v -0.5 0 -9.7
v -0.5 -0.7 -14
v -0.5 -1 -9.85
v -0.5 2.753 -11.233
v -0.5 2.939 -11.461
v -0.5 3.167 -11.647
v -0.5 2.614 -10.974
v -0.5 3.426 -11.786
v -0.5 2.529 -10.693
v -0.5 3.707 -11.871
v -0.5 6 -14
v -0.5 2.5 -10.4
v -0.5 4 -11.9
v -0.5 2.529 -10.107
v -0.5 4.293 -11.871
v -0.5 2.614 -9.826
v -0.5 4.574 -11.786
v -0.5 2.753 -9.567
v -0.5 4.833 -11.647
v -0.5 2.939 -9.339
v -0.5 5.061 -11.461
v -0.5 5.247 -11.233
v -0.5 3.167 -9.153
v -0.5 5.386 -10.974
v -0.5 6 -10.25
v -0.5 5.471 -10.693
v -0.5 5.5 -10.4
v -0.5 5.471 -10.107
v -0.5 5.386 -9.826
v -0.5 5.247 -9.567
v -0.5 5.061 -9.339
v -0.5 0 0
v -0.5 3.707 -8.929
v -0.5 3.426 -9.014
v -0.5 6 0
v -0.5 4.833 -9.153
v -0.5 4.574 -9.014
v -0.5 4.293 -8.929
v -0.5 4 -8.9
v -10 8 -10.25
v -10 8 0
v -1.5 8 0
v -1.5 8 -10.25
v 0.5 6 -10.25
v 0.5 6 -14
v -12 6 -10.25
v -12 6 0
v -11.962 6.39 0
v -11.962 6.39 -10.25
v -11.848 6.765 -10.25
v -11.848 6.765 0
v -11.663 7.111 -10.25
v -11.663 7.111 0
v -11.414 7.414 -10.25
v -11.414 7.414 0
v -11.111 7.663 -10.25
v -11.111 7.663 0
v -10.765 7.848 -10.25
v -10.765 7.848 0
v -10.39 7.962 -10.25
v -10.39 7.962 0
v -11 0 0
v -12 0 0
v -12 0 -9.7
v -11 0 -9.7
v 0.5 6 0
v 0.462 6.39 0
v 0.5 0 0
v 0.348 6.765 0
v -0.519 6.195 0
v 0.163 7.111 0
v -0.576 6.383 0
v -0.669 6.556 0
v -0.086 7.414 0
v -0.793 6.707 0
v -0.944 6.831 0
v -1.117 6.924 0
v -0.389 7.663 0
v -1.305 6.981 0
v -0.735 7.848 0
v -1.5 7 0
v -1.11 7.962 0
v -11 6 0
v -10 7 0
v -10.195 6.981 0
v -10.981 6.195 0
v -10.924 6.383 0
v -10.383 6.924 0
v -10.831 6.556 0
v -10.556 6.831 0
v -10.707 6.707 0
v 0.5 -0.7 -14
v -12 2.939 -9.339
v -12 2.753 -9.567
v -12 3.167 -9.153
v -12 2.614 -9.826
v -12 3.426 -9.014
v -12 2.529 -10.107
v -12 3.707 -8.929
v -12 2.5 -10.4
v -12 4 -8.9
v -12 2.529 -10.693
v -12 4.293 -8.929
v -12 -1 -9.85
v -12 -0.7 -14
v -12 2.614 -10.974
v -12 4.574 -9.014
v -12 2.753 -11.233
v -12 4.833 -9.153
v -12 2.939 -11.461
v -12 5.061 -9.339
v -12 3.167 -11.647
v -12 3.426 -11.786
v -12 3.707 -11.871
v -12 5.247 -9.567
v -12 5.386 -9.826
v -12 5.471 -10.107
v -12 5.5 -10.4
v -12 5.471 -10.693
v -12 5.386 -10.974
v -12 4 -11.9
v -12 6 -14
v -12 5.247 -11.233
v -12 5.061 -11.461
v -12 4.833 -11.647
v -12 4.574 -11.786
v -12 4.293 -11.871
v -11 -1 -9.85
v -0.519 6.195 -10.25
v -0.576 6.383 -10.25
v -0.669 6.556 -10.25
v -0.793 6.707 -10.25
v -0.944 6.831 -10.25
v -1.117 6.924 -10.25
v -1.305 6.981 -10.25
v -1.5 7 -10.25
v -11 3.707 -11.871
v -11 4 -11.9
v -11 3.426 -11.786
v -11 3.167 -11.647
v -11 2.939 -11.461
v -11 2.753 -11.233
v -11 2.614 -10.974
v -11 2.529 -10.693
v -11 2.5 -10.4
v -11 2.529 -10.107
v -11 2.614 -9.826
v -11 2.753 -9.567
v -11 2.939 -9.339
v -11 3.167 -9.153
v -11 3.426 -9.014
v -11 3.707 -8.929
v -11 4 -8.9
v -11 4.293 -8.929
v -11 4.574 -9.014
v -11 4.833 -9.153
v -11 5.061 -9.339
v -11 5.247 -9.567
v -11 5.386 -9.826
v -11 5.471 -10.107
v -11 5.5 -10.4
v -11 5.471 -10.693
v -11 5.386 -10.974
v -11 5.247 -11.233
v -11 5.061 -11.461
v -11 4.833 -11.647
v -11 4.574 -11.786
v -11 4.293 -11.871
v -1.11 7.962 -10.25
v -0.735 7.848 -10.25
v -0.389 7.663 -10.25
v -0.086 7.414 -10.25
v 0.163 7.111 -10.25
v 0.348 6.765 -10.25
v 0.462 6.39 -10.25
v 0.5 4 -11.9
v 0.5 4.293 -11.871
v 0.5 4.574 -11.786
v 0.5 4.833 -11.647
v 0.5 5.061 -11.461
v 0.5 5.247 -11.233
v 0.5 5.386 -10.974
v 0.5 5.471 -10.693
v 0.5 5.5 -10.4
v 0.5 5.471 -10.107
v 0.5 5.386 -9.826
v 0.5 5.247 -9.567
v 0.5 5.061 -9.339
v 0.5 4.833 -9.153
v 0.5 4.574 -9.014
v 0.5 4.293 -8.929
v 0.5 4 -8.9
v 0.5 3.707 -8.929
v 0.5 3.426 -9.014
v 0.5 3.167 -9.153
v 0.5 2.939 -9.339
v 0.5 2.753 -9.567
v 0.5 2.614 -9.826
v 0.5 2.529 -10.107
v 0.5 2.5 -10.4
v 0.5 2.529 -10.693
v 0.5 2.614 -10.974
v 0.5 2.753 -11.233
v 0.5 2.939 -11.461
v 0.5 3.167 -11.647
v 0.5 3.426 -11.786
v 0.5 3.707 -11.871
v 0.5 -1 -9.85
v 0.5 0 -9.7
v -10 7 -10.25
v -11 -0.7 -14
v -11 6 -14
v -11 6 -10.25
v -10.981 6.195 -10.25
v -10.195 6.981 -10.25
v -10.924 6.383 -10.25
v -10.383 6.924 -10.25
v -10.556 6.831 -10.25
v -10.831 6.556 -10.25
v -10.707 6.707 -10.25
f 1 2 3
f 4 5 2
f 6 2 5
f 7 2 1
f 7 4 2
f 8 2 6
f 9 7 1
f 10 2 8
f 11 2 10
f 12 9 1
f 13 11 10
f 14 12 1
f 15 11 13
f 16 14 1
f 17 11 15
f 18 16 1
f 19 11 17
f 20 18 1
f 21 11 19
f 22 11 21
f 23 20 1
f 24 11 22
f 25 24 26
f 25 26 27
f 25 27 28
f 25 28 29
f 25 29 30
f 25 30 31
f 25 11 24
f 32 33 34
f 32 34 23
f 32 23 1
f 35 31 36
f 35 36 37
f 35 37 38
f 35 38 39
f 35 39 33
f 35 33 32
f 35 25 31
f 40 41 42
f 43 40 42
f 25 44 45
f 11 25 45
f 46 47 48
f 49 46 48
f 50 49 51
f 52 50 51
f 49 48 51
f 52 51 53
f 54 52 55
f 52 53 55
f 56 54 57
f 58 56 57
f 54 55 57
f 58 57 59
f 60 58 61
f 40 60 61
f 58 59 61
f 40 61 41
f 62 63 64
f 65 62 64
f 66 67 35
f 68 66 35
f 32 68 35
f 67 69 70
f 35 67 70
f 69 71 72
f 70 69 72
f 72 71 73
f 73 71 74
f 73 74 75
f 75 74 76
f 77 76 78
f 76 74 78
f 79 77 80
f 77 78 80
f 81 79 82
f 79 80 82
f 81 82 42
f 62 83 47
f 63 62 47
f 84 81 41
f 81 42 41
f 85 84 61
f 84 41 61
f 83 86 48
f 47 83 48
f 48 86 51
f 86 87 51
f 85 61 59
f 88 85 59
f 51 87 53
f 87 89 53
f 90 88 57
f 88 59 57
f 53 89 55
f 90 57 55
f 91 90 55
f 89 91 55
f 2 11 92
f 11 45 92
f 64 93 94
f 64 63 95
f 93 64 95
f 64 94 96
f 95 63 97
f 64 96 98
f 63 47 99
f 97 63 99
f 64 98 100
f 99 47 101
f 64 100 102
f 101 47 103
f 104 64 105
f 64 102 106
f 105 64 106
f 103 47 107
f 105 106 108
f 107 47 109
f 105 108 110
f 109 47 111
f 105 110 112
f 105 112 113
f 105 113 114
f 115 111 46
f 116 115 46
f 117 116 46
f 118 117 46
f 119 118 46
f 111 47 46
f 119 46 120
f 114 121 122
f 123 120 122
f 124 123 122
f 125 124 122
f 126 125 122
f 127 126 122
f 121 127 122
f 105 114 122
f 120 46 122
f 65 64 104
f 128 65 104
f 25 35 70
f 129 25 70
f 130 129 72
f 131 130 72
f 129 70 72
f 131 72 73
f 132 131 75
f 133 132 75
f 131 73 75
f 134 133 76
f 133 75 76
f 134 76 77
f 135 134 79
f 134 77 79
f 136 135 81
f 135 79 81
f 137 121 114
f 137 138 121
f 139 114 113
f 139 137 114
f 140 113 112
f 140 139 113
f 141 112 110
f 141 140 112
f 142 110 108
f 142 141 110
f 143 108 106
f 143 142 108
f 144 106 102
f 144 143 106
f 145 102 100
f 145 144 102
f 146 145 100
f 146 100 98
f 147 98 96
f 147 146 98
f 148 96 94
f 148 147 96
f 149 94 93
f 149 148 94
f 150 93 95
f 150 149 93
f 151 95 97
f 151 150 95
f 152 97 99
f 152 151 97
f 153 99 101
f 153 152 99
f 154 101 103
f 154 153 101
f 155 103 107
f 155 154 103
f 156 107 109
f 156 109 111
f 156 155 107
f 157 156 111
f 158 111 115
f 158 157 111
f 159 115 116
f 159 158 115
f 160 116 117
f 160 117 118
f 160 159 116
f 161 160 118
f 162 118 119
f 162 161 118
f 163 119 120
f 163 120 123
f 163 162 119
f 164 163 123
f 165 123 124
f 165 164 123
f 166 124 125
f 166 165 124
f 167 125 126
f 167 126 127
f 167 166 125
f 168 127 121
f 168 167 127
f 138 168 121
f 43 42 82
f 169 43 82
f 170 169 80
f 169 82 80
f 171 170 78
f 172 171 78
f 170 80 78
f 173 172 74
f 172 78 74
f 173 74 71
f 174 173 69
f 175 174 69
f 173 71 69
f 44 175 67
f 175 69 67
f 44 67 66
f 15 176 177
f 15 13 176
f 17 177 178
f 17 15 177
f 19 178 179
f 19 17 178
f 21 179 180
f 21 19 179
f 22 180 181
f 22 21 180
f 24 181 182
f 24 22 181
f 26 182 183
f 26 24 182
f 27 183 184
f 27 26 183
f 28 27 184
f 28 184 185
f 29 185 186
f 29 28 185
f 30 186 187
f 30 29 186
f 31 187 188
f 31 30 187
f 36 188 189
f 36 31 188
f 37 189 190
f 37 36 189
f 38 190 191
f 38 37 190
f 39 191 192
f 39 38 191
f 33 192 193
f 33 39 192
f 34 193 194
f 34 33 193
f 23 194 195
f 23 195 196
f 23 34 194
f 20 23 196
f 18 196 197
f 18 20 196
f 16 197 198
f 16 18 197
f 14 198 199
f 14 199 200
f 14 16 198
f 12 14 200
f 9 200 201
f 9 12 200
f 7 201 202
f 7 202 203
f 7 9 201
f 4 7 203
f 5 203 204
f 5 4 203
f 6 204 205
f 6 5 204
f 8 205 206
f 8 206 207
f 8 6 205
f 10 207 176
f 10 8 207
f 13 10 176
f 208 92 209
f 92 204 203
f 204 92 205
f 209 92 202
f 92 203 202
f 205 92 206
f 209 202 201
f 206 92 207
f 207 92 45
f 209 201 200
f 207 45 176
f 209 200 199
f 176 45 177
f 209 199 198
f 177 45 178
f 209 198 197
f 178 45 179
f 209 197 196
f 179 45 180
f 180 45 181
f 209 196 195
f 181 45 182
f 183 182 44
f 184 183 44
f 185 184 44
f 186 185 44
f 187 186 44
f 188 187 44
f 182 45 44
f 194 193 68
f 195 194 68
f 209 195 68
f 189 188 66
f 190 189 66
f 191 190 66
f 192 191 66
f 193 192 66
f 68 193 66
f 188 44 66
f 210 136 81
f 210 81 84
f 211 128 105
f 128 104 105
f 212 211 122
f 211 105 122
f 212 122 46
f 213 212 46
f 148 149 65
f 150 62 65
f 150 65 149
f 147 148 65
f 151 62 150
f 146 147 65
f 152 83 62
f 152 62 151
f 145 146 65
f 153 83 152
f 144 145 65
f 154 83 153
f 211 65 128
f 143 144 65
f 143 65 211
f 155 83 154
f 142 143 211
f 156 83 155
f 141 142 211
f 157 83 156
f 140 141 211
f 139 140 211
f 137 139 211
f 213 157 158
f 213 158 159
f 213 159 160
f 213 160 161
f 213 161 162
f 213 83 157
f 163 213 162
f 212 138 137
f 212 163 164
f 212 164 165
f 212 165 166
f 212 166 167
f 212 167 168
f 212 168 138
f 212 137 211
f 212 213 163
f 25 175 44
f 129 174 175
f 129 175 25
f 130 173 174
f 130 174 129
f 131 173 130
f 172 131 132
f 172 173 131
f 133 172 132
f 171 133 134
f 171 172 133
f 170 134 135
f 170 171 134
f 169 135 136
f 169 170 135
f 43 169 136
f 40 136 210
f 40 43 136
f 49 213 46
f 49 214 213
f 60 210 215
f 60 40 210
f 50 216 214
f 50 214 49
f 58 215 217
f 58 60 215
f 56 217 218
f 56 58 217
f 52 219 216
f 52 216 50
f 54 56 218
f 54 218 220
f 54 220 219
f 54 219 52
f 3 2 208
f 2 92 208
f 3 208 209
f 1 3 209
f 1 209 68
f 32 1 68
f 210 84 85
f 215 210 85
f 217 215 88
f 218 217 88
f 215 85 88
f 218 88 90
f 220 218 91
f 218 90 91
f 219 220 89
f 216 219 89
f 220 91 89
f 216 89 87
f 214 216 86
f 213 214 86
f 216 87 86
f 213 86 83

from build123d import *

# Parameters (mm, degrees)
SKETCH1_R           = 1.5
BOSS_EXTRUDE1_DEPTH = 0.5
SKETCH2_R           = 1.5
BOSS_EXTRUDE2_DEPTH = 0.5
BOSS_EXTRUDE6_DEPTH = 10.25


with BuildPart() as part:
    # Sketch1 → Boss-Extrude1 (new, symmetric)
    with BuildSketch(Plane(origin=(0, 0, 0), x_dir=(0, 0, -1), z_dir=(1, 0, 0))):
        Polygon((0, 0), (0, 6), (14, 6), (14, -0.7), (9.85, -1), (9.7, 0), align=None)
        with Locations((10.4, 4)):
            Circle(SKETCH1_R, mode=Mode.SUBTRACT)
    extrude(amount=BOSS_EXTRUDE1_DEPTH, both=True)



with BuildPart() as body_2:
    # Sketch2 → Boss-Extrude2 (new, symmetric)
    with BuildSketch(Plane.ZY.offset(11.5)):
        Polygon((-9.7, 0), (-9.85, -1), (-14, -0.7), (-14, 6), (0, 6), (0, 0), align=None)
        with Locations(Location((-10.4, 4, 0), (0, 0, 180))):
            Circle(SKETCH2_R, mode=Mode.SUBTRACT)
    extrude(amount=BOSS_EXTRUDE2_DEPTH, both=True)


with BuildPart() as part_1:
    add(part.part)

    add(body_2.part)  # Boss-Extrude6 merges body 2
    # Sketch9 → Boss-Extrude6 (add)
    with BuildSketch(Plane.XY):
        with BuildLine():
            Line((-11, 6), (-12, 6))
            ThreePointArc((-12, 6), (-11.414213562, 7.414213562), (-10, 8))
            Line((-10, 8), (-1.5, 8))
            ThreePointArc((-1.5, 8), (-0.085786438, 7.414213562), (0.5, 6))
            Line((0.5, 6), (-0.5, 6))
            ThreePointArc((-0.5, 6), (-0.792893219, 6.707106781), (-1.5, 7))
            Line((-1.5, 7), (-10, 7))
            ThreePointArc((-10, 7), (-10.707106781, 6.707106781), (-11, 6))
        make_face()
    extrude(amount=-BOSS_EXTRUDE6_DEPTH)


solid = part_1.part
